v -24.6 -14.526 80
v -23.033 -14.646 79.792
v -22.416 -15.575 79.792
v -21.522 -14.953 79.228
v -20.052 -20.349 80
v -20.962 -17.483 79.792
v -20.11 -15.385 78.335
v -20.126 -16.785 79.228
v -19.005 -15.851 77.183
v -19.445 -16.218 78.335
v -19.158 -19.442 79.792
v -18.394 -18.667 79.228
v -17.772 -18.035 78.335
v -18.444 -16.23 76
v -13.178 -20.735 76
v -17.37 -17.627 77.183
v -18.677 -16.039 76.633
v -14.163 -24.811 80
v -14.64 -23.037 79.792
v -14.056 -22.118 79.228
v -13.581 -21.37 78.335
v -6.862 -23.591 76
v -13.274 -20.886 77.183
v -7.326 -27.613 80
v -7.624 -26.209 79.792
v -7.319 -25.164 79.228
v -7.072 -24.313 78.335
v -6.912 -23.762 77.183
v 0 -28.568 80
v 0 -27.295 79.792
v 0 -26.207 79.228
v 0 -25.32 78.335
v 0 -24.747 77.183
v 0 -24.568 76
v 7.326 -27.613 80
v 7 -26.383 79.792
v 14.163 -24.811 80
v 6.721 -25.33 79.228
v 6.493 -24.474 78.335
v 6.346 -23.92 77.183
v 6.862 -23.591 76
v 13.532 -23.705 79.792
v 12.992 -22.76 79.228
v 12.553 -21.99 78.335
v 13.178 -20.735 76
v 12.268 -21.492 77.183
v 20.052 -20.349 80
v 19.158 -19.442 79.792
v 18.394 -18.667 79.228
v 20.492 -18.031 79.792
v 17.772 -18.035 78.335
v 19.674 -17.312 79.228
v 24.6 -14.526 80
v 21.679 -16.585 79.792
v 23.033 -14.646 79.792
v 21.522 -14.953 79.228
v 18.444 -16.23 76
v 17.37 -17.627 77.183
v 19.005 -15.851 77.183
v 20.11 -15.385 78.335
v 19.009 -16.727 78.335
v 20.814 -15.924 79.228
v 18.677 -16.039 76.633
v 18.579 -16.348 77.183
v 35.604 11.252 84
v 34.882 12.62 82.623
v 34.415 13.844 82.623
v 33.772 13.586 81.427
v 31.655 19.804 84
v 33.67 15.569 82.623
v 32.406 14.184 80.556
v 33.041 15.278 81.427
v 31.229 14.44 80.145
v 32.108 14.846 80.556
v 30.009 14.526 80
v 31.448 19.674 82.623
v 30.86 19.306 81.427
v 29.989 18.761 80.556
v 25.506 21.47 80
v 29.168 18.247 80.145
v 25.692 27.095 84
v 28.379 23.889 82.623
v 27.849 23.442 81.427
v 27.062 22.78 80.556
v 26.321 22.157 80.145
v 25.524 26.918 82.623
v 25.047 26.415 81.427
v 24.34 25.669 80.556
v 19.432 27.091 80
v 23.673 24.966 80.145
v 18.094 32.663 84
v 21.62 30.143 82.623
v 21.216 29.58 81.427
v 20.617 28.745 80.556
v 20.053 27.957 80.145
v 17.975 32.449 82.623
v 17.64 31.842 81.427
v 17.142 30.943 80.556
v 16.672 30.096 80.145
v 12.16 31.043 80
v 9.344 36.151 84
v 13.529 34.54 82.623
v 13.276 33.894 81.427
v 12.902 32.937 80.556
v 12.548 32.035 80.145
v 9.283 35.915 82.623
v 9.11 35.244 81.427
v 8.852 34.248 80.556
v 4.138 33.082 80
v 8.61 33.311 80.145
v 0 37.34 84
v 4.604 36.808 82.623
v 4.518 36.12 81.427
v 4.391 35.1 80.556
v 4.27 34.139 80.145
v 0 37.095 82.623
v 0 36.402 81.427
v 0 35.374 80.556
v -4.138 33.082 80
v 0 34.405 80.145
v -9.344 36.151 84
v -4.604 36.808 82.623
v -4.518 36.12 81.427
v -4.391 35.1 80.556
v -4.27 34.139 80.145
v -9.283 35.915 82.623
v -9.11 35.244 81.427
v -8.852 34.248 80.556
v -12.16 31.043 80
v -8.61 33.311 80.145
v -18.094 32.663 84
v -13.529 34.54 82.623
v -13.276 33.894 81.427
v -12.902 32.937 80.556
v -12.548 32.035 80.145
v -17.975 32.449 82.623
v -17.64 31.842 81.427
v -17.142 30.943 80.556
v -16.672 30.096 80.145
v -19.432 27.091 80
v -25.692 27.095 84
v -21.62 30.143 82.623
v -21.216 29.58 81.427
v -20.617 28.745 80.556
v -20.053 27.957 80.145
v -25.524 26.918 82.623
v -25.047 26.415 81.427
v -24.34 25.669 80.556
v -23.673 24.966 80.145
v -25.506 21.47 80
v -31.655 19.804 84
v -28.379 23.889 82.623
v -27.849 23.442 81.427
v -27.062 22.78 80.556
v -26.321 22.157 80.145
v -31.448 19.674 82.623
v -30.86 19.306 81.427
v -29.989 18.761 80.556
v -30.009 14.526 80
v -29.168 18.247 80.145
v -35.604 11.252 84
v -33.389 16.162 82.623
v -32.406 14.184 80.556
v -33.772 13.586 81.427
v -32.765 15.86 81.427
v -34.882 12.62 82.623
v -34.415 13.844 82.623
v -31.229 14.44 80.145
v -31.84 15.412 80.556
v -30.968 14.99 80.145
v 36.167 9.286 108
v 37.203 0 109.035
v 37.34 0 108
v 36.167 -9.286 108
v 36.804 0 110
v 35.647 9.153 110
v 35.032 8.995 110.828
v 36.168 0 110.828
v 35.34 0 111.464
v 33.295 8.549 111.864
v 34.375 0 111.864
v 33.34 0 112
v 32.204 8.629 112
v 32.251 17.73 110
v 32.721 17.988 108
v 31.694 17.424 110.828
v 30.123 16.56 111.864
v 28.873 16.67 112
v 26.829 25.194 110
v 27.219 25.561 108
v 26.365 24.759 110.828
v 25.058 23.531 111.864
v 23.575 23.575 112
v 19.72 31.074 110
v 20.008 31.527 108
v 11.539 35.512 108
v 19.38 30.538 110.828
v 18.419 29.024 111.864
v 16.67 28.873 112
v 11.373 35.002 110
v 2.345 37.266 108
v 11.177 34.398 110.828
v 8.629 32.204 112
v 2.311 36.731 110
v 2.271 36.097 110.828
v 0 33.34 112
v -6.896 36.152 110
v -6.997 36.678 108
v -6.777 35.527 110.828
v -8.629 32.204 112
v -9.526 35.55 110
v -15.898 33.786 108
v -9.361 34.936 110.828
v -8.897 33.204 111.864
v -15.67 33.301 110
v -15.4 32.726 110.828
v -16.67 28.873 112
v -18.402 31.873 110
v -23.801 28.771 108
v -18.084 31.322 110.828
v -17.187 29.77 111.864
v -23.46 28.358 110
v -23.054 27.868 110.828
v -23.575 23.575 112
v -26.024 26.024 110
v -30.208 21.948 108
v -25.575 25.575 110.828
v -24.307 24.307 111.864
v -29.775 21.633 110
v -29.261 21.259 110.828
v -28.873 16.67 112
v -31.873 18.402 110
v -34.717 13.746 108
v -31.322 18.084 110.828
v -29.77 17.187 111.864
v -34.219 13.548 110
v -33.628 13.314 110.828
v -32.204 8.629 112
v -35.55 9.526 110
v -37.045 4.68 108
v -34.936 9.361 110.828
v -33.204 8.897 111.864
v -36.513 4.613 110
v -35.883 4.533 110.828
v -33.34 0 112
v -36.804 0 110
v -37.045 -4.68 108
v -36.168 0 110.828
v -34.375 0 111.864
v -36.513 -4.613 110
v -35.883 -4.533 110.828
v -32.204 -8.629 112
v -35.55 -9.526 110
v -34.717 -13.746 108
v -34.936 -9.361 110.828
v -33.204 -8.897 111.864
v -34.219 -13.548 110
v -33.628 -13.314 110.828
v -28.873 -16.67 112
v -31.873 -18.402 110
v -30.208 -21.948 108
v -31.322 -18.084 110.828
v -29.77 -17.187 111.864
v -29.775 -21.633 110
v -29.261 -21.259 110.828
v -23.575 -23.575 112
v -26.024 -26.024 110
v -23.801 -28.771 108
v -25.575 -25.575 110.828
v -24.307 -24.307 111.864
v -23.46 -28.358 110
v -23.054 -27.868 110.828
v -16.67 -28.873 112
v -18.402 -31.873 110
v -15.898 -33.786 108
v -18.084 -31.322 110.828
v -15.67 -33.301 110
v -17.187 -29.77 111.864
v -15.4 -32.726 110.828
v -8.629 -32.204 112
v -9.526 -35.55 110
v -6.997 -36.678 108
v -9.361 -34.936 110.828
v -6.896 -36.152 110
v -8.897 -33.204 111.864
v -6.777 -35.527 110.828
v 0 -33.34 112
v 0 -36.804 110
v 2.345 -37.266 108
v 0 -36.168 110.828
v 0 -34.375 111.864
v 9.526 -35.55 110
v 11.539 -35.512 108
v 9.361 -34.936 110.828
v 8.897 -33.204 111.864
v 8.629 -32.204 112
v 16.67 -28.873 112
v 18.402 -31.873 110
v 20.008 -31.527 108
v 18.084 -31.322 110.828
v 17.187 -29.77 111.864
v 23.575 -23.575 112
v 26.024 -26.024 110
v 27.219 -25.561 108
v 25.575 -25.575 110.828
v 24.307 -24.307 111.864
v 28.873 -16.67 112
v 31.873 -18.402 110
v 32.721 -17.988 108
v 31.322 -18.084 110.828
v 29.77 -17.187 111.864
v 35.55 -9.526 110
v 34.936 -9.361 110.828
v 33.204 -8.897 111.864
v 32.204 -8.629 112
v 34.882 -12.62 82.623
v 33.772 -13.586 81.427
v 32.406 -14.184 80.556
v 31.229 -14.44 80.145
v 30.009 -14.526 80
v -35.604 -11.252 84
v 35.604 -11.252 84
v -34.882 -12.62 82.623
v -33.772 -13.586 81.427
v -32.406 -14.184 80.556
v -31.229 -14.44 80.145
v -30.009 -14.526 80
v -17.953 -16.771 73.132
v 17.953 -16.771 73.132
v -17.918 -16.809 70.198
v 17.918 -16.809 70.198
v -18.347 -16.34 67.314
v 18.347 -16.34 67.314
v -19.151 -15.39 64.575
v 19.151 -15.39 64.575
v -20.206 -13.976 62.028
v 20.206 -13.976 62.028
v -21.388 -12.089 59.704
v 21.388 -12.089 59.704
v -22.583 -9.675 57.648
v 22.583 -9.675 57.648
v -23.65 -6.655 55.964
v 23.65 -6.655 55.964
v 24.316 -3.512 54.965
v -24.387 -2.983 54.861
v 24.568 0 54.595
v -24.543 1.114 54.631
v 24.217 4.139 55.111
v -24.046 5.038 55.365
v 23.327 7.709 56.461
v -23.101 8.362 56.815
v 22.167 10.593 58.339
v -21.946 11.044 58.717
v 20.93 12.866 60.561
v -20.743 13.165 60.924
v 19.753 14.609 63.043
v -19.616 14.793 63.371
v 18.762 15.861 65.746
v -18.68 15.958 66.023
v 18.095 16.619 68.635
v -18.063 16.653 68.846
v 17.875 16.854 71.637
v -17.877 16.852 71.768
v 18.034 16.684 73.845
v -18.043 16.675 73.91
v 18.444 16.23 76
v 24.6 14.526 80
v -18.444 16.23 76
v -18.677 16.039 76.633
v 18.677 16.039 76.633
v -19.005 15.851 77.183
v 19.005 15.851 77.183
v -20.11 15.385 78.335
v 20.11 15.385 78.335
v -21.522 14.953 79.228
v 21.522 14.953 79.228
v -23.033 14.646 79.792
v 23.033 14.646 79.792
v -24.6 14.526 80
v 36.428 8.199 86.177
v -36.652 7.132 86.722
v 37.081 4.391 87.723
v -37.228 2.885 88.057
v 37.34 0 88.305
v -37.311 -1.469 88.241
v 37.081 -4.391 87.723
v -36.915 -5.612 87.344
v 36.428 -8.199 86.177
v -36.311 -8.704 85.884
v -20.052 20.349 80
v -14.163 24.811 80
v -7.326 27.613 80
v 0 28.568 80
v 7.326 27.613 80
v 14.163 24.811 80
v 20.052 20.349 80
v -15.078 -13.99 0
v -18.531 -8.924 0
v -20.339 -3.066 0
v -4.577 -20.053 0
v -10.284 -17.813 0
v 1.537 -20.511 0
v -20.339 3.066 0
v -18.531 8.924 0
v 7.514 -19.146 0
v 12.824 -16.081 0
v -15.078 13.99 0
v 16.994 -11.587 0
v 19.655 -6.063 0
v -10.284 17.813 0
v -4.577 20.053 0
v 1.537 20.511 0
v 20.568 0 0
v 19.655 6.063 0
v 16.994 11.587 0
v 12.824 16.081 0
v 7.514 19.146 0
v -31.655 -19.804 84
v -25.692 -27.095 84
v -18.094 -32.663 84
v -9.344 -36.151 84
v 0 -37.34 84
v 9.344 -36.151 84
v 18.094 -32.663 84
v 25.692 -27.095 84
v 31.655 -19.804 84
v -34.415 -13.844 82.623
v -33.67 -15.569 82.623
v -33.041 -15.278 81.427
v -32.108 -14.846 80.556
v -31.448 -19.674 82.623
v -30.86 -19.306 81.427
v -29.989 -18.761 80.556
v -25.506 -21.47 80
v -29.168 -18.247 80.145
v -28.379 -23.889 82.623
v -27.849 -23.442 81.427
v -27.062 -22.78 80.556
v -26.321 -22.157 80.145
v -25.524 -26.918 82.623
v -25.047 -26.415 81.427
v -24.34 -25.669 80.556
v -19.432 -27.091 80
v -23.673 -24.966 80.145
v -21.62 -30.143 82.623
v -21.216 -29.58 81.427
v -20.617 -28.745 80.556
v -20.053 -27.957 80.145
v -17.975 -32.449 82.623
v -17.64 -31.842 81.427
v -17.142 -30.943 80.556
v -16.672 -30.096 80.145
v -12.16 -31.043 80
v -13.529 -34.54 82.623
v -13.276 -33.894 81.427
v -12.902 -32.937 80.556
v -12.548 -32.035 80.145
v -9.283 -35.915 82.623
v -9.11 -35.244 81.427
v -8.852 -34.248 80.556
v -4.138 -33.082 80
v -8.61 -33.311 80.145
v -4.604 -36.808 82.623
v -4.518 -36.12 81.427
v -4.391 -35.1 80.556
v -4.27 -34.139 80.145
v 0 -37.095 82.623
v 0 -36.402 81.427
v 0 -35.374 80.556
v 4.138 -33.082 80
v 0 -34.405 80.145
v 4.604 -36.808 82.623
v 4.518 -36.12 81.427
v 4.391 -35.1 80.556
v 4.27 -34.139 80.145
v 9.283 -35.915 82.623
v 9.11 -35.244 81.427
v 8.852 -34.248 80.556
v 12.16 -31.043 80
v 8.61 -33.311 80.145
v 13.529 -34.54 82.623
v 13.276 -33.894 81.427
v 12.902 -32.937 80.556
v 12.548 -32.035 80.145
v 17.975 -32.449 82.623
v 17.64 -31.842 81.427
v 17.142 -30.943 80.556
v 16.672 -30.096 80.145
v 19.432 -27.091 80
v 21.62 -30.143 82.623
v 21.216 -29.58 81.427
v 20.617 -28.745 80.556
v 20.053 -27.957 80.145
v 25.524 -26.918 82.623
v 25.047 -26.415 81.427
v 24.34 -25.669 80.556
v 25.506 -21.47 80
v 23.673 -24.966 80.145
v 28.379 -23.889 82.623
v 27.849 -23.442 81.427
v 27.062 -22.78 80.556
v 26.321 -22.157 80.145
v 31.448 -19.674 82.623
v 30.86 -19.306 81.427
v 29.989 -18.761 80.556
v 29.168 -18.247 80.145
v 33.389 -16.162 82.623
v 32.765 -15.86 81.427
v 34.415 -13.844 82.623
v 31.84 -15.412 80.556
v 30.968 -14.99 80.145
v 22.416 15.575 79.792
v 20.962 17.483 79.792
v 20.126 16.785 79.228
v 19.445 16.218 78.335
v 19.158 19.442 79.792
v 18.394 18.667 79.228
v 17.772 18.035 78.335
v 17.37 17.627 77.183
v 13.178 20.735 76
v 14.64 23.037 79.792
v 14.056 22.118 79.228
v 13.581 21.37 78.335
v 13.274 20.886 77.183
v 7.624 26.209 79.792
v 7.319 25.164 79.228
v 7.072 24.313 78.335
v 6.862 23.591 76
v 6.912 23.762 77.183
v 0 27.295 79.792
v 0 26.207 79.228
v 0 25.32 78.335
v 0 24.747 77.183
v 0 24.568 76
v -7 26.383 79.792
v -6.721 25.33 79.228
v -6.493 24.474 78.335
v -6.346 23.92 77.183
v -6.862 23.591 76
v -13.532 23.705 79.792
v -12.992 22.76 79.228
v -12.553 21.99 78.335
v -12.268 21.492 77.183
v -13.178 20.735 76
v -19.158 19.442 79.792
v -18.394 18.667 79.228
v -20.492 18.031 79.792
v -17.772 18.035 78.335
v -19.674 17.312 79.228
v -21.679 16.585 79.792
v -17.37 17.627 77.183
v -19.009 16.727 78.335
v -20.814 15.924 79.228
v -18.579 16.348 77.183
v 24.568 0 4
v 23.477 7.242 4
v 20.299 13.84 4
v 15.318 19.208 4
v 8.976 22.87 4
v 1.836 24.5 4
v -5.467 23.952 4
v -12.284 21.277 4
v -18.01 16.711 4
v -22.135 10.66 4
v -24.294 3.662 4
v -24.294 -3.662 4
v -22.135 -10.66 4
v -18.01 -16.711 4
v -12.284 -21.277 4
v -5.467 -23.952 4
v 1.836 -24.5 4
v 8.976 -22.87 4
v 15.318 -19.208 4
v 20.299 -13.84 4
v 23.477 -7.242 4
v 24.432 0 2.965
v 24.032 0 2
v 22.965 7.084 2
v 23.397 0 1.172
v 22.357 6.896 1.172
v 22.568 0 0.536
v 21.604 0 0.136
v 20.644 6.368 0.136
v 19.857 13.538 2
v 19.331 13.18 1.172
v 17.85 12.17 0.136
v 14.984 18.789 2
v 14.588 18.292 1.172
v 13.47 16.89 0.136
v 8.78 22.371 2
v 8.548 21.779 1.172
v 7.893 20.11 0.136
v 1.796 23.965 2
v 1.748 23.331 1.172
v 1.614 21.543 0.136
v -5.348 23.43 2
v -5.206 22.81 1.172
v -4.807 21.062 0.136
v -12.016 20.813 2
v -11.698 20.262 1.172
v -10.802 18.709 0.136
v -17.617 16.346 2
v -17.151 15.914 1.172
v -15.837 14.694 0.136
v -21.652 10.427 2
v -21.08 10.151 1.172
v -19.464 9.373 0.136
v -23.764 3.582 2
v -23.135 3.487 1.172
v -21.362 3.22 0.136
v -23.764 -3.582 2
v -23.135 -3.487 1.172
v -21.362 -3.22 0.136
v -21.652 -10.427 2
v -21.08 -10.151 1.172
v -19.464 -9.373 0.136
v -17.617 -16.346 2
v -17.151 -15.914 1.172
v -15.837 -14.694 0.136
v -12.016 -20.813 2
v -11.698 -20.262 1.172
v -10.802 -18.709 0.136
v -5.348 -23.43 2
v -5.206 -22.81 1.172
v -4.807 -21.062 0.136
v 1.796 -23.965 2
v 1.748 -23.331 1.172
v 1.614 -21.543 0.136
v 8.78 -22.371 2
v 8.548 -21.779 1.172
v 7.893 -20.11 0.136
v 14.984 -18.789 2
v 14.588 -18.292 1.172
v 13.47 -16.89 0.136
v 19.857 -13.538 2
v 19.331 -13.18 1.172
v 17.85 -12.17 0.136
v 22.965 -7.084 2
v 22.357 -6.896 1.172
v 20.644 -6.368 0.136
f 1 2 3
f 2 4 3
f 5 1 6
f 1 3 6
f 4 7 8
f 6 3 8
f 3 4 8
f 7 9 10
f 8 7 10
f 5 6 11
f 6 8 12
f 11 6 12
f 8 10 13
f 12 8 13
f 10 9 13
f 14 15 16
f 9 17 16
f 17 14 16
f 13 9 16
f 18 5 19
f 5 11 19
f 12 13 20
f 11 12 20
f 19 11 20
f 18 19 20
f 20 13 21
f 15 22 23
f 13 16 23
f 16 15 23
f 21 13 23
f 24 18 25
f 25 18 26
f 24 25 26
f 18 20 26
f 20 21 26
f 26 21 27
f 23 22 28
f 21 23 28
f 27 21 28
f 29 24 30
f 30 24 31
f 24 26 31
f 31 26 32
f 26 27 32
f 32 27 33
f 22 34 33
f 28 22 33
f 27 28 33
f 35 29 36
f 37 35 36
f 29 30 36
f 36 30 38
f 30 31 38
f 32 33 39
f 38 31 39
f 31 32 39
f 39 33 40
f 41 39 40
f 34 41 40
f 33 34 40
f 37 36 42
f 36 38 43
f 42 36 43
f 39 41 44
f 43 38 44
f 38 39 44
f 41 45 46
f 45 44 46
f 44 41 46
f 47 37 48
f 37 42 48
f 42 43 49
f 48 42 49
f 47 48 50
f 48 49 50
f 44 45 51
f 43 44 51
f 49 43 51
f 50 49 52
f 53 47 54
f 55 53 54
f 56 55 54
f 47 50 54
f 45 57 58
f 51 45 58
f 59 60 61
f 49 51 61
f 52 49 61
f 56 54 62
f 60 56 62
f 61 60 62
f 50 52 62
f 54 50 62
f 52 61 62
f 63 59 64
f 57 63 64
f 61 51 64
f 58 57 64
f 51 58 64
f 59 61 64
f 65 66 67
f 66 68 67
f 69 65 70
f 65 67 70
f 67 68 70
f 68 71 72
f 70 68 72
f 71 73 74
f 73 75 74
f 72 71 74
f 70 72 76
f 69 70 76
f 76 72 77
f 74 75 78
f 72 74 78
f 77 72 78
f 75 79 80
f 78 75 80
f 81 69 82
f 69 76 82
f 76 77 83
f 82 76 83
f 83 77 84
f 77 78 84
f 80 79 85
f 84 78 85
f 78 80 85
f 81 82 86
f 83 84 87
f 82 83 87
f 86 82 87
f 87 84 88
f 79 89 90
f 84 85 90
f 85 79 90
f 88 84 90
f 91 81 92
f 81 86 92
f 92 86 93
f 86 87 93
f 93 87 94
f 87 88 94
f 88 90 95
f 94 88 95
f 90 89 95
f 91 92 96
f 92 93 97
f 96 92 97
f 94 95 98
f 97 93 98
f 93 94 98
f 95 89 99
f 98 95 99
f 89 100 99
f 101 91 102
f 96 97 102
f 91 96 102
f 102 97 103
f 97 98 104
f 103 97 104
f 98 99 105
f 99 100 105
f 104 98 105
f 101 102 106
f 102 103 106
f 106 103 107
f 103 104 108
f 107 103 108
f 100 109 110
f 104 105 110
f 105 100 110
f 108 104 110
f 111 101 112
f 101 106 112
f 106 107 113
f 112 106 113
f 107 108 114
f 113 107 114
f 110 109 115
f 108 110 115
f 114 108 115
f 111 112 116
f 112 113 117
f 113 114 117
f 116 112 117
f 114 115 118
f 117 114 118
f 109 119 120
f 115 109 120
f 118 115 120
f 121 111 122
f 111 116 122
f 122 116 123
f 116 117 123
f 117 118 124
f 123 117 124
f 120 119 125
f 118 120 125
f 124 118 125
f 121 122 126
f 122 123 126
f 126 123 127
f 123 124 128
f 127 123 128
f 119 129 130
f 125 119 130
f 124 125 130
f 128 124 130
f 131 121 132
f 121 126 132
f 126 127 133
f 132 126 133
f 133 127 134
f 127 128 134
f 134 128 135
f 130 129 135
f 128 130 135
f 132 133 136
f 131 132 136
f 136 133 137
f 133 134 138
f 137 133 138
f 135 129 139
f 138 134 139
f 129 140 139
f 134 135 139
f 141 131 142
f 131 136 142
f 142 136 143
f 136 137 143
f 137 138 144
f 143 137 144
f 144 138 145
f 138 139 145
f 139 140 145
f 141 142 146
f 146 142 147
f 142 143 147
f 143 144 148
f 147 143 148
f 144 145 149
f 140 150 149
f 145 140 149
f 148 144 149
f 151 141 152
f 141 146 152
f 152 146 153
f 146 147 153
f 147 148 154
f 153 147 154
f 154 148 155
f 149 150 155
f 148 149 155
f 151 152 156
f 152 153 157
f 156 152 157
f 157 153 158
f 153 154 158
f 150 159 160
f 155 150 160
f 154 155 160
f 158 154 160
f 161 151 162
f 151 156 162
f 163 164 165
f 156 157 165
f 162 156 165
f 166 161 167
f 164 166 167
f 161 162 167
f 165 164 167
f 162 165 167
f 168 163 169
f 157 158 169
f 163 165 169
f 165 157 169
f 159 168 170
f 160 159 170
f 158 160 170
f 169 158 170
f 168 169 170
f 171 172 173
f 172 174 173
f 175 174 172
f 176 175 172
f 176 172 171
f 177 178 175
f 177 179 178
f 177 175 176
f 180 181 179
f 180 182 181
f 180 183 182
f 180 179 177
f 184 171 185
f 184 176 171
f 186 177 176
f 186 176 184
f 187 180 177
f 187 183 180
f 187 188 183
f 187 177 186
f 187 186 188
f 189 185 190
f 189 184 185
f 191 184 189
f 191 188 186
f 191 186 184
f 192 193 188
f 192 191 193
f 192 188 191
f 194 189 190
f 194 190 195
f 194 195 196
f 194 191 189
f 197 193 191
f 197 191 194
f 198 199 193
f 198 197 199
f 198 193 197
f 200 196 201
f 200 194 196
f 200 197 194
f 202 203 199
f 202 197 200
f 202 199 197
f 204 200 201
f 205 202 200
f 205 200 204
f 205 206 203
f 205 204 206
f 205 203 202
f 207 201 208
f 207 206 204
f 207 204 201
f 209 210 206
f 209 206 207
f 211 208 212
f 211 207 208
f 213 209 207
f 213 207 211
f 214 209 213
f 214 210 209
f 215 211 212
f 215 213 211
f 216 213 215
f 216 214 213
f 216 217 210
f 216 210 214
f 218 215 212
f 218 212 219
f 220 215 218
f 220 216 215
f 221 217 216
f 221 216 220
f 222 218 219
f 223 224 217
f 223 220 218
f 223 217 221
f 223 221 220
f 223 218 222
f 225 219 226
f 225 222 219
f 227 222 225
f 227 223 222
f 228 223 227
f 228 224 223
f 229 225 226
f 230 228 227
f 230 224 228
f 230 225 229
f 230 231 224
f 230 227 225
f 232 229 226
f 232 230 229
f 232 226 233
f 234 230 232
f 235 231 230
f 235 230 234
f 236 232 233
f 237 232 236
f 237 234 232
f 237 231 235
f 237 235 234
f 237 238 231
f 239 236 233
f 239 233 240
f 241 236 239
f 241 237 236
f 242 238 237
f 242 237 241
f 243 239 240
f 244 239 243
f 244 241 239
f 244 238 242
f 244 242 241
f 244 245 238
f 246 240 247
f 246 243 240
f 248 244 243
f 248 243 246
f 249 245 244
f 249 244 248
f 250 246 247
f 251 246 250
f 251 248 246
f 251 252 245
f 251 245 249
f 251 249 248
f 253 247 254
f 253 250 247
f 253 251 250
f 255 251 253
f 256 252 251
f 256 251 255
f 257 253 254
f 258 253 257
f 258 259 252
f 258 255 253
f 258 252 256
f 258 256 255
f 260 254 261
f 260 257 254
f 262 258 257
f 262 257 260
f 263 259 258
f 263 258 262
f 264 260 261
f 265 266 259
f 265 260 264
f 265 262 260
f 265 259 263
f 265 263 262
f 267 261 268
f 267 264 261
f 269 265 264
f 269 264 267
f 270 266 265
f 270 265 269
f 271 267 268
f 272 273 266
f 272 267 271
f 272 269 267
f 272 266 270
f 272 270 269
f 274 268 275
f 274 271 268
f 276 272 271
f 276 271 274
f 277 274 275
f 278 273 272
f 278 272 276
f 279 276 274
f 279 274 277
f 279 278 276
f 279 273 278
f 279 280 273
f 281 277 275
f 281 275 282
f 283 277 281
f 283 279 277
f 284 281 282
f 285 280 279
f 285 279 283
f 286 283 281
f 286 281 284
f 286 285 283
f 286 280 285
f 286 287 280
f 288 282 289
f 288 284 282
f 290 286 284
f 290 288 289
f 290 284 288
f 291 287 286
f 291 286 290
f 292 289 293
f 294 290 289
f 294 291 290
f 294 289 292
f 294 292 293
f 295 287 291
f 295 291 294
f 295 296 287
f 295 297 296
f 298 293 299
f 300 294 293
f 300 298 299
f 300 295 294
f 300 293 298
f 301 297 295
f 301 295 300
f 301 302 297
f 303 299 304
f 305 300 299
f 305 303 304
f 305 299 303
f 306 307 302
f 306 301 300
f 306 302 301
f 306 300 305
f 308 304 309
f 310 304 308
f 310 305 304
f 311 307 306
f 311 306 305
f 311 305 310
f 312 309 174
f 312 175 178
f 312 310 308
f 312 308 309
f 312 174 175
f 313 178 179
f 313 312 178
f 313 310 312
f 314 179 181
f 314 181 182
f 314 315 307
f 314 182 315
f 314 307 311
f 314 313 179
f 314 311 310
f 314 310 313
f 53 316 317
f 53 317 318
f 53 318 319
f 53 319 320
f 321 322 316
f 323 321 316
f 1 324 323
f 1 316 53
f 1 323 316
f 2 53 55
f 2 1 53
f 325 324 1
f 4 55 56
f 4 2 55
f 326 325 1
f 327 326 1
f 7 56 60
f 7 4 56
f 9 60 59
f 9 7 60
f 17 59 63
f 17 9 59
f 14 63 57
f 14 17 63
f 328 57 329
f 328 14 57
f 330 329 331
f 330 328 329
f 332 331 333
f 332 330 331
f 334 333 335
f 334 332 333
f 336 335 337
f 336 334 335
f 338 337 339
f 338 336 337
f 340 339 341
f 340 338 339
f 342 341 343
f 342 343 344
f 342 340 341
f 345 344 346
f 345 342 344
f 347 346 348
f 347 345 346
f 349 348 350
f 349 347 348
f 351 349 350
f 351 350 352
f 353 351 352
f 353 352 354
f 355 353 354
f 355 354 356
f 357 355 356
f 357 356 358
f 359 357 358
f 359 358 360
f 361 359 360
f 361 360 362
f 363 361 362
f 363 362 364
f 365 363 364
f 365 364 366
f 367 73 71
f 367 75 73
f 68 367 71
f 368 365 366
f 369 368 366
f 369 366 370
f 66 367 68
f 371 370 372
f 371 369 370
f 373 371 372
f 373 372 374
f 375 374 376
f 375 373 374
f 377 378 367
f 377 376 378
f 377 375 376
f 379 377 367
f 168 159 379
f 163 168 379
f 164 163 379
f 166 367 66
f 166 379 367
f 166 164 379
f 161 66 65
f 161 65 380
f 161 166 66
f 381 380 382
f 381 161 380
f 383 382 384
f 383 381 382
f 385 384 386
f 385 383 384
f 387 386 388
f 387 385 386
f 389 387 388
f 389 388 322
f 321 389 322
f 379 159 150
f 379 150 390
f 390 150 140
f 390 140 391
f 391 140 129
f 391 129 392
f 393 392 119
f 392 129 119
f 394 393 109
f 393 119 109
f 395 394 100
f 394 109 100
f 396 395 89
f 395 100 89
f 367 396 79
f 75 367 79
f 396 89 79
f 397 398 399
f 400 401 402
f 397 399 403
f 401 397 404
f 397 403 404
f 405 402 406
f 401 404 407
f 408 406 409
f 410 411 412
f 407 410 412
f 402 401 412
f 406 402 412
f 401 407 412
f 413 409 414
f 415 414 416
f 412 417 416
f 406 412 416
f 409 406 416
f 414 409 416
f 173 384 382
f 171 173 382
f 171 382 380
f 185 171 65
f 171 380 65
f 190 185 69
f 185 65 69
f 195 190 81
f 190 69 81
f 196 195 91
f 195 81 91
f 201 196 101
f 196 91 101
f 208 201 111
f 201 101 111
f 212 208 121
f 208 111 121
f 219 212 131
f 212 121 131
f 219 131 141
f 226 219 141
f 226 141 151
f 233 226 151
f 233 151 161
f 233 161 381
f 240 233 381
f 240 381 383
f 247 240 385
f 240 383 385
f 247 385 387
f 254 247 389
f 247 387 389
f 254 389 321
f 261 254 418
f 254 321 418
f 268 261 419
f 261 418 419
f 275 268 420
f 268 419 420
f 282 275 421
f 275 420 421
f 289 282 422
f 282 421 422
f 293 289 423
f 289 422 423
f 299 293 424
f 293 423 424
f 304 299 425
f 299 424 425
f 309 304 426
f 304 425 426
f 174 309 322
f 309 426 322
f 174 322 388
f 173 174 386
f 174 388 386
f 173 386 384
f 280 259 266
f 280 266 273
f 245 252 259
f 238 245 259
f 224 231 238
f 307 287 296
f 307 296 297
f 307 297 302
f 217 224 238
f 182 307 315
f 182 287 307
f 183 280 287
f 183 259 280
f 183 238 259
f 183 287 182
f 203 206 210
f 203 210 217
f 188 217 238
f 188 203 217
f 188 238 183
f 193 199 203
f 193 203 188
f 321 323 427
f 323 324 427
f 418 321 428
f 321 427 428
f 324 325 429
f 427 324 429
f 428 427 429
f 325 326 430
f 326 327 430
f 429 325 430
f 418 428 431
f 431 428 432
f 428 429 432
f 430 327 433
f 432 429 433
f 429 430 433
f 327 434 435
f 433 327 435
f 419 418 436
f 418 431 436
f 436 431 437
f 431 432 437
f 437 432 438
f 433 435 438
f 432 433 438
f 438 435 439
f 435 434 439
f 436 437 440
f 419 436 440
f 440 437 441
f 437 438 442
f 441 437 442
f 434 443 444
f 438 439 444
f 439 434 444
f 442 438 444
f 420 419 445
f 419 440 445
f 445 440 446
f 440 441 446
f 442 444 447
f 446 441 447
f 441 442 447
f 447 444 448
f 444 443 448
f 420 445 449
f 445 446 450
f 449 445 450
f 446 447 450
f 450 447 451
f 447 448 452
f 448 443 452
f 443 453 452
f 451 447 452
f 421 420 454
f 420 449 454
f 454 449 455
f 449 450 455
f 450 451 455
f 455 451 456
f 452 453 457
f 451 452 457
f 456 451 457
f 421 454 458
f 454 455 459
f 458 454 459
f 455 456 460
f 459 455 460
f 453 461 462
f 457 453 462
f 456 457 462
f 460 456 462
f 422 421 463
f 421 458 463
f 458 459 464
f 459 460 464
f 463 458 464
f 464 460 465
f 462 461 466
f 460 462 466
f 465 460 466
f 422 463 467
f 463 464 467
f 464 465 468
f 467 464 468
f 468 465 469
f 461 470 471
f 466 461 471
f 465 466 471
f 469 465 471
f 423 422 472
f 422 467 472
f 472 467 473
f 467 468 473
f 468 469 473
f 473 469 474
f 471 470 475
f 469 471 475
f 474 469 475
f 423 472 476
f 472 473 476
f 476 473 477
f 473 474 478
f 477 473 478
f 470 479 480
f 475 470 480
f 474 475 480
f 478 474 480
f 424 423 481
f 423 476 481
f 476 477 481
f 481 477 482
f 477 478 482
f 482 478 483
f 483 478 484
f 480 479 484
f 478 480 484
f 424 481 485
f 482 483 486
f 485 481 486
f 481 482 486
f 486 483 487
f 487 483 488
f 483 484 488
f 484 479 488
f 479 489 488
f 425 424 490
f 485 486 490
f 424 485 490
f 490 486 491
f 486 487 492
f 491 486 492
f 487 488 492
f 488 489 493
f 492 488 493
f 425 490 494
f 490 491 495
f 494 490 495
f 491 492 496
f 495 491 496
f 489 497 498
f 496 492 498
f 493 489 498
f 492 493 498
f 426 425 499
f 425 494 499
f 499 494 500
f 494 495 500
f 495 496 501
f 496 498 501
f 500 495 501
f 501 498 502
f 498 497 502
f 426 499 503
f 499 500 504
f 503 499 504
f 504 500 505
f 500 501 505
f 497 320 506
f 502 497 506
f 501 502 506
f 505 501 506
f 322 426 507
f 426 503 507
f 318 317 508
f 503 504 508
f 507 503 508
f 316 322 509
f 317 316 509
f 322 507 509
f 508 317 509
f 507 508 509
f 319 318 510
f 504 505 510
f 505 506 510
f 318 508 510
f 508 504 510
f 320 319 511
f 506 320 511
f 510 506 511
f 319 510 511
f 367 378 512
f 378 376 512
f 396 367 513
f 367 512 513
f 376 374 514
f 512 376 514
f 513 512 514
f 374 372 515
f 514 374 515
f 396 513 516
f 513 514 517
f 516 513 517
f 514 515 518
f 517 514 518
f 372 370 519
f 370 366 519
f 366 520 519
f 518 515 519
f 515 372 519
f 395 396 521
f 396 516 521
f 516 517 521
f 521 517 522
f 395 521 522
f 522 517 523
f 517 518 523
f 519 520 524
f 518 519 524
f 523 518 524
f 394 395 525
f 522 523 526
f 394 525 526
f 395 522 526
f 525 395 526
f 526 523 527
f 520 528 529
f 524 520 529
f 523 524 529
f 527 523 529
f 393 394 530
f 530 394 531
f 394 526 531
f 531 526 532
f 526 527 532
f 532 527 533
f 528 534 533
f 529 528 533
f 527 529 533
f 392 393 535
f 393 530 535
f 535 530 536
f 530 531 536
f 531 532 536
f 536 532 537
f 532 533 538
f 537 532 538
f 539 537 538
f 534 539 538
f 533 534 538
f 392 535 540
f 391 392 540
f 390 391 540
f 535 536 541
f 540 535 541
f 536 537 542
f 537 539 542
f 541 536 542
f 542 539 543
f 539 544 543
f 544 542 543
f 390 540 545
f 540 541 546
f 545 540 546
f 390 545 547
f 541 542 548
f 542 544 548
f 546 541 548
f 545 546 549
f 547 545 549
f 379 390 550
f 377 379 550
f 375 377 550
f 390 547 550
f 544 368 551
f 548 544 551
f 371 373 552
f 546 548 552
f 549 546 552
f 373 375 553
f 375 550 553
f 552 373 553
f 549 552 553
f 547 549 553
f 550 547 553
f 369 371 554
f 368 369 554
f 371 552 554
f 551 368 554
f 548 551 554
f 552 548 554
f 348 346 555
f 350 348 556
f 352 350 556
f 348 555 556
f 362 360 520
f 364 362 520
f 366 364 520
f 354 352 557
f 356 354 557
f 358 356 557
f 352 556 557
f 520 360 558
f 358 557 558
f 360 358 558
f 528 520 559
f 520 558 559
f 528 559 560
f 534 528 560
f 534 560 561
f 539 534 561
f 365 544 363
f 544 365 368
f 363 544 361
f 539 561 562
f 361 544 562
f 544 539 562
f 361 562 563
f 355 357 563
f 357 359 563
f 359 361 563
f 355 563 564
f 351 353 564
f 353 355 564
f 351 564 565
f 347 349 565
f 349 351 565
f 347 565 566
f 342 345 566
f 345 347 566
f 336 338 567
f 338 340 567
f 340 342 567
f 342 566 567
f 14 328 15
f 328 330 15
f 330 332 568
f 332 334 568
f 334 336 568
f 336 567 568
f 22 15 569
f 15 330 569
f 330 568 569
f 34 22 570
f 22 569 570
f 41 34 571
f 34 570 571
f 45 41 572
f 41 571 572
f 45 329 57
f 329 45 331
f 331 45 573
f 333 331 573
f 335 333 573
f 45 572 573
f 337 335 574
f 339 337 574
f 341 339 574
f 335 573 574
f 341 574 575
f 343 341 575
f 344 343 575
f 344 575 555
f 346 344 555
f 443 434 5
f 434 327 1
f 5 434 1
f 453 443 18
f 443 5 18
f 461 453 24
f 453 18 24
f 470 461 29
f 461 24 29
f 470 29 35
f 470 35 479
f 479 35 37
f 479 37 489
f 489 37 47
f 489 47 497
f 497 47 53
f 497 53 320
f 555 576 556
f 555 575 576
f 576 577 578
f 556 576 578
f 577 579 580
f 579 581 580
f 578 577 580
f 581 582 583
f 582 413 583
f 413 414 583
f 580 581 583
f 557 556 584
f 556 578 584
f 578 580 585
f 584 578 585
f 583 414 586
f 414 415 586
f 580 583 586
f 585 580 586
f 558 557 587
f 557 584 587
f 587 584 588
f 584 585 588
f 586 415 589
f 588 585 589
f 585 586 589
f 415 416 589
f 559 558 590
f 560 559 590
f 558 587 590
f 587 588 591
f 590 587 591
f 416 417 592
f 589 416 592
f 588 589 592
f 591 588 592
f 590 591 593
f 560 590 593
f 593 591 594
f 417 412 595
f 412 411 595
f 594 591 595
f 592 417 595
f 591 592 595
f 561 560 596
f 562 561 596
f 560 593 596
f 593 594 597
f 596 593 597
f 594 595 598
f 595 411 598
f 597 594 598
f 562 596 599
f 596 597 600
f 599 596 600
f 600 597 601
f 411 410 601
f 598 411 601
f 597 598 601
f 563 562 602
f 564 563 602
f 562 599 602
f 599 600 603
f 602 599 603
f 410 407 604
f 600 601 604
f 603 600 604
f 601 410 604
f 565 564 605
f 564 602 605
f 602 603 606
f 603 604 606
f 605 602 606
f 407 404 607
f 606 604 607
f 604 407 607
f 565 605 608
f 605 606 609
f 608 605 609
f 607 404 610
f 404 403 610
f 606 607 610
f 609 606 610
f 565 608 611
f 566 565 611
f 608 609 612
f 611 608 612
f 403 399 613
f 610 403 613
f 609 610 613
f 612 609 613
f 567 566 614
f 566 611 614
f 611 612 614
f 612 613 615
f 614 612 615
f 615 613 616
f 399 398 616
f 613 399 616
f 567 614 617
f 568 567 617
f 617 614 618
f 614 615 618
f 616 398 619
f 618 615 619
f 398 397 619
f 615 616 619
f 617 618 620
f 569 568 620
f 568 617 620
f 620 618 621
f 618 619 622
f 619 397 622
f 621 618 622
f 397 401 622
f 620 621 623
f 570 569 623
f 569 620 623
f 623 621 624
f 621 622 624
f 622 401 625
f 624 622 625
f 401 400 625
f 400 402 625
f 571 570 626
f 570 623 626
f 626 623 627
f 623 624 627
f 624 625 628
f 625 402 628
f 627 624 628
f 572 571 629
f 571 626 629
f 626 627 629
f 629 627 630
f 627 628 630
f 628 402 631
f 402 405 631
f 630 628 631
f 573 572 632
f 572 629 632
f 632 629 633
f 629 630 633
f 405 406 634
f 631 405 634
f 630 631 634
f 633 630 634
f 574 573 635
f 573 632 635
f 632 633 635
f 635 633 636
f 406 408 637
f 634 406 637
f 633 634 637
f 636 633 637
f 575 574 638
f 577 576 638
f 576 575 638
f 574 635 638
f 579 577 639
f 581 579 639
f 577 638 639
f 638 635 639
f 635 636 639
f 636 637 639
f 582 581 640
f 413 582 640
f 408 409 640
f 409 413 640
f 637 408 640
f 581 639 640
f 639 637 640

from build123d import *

# Parameters (mm, degrees)
SKETCH1_R               = 24.568302704
EXTRUDE1_DEPTH          = 80
SKETCH2_R               = 37.339605778
EXTRUDE2_DEPTH          = 32
FILLET1_R               = 4
CUT_EXTRUDE1_DEPTH      = 32
CUT_EXTRUDE1_DEPTH_BACK = 77
SKETCH3_R               = 16.855421097


with BuildPart() as part:
    # Sketch1 → Extrude1 (new body)
    with BuildSketch(Plane.XY):
        Circle(SKETCH1_R)
    extrude(amount=EXTRUDE1_DEPTH)

    # Sketch2 → Extrude2 (add)
    with BuildSketch(Plane.XY.offset(80)):
        Circle(SKETCH2_R)
    extrude(amount=EXTRUDE2_DEPTH)

    # Fillet1
    fillet1_edges = [part.edges().sort_by_distance(p)[0] for p in [
        (-24.568302704, 0, 0),
        (-24.568302704, 0, 80),
        (-37.339605778, 0, 80),
        (-37.339605778, 0, 112),
    ]]
    fillet(fillet1_edges, radius=FILLET1_R)

    # Sketch3 → Cut-Extrude1 (cut, two sides: drawn at the far end of the back side and taken through both)
    with BuildSketch(Plane(origin=(25, 0, 0), x_dir=(0, 0, -1), z_dir=(1, 0, 0)).offset(-CUT_EXTRUDE1_DEPTH_BACK)):
        with Locations(Location((-71.449956272, 0, 0), (0, 0, 221.877807058))):
            Circle(SKETCH3_R)
    extrude(amount=CUT_EXTRUDE1_DEPTH + CUT_EXTRUDE1_DEPTH_BACK, mode=Mode.SUBTRACT)


solid = part.part
